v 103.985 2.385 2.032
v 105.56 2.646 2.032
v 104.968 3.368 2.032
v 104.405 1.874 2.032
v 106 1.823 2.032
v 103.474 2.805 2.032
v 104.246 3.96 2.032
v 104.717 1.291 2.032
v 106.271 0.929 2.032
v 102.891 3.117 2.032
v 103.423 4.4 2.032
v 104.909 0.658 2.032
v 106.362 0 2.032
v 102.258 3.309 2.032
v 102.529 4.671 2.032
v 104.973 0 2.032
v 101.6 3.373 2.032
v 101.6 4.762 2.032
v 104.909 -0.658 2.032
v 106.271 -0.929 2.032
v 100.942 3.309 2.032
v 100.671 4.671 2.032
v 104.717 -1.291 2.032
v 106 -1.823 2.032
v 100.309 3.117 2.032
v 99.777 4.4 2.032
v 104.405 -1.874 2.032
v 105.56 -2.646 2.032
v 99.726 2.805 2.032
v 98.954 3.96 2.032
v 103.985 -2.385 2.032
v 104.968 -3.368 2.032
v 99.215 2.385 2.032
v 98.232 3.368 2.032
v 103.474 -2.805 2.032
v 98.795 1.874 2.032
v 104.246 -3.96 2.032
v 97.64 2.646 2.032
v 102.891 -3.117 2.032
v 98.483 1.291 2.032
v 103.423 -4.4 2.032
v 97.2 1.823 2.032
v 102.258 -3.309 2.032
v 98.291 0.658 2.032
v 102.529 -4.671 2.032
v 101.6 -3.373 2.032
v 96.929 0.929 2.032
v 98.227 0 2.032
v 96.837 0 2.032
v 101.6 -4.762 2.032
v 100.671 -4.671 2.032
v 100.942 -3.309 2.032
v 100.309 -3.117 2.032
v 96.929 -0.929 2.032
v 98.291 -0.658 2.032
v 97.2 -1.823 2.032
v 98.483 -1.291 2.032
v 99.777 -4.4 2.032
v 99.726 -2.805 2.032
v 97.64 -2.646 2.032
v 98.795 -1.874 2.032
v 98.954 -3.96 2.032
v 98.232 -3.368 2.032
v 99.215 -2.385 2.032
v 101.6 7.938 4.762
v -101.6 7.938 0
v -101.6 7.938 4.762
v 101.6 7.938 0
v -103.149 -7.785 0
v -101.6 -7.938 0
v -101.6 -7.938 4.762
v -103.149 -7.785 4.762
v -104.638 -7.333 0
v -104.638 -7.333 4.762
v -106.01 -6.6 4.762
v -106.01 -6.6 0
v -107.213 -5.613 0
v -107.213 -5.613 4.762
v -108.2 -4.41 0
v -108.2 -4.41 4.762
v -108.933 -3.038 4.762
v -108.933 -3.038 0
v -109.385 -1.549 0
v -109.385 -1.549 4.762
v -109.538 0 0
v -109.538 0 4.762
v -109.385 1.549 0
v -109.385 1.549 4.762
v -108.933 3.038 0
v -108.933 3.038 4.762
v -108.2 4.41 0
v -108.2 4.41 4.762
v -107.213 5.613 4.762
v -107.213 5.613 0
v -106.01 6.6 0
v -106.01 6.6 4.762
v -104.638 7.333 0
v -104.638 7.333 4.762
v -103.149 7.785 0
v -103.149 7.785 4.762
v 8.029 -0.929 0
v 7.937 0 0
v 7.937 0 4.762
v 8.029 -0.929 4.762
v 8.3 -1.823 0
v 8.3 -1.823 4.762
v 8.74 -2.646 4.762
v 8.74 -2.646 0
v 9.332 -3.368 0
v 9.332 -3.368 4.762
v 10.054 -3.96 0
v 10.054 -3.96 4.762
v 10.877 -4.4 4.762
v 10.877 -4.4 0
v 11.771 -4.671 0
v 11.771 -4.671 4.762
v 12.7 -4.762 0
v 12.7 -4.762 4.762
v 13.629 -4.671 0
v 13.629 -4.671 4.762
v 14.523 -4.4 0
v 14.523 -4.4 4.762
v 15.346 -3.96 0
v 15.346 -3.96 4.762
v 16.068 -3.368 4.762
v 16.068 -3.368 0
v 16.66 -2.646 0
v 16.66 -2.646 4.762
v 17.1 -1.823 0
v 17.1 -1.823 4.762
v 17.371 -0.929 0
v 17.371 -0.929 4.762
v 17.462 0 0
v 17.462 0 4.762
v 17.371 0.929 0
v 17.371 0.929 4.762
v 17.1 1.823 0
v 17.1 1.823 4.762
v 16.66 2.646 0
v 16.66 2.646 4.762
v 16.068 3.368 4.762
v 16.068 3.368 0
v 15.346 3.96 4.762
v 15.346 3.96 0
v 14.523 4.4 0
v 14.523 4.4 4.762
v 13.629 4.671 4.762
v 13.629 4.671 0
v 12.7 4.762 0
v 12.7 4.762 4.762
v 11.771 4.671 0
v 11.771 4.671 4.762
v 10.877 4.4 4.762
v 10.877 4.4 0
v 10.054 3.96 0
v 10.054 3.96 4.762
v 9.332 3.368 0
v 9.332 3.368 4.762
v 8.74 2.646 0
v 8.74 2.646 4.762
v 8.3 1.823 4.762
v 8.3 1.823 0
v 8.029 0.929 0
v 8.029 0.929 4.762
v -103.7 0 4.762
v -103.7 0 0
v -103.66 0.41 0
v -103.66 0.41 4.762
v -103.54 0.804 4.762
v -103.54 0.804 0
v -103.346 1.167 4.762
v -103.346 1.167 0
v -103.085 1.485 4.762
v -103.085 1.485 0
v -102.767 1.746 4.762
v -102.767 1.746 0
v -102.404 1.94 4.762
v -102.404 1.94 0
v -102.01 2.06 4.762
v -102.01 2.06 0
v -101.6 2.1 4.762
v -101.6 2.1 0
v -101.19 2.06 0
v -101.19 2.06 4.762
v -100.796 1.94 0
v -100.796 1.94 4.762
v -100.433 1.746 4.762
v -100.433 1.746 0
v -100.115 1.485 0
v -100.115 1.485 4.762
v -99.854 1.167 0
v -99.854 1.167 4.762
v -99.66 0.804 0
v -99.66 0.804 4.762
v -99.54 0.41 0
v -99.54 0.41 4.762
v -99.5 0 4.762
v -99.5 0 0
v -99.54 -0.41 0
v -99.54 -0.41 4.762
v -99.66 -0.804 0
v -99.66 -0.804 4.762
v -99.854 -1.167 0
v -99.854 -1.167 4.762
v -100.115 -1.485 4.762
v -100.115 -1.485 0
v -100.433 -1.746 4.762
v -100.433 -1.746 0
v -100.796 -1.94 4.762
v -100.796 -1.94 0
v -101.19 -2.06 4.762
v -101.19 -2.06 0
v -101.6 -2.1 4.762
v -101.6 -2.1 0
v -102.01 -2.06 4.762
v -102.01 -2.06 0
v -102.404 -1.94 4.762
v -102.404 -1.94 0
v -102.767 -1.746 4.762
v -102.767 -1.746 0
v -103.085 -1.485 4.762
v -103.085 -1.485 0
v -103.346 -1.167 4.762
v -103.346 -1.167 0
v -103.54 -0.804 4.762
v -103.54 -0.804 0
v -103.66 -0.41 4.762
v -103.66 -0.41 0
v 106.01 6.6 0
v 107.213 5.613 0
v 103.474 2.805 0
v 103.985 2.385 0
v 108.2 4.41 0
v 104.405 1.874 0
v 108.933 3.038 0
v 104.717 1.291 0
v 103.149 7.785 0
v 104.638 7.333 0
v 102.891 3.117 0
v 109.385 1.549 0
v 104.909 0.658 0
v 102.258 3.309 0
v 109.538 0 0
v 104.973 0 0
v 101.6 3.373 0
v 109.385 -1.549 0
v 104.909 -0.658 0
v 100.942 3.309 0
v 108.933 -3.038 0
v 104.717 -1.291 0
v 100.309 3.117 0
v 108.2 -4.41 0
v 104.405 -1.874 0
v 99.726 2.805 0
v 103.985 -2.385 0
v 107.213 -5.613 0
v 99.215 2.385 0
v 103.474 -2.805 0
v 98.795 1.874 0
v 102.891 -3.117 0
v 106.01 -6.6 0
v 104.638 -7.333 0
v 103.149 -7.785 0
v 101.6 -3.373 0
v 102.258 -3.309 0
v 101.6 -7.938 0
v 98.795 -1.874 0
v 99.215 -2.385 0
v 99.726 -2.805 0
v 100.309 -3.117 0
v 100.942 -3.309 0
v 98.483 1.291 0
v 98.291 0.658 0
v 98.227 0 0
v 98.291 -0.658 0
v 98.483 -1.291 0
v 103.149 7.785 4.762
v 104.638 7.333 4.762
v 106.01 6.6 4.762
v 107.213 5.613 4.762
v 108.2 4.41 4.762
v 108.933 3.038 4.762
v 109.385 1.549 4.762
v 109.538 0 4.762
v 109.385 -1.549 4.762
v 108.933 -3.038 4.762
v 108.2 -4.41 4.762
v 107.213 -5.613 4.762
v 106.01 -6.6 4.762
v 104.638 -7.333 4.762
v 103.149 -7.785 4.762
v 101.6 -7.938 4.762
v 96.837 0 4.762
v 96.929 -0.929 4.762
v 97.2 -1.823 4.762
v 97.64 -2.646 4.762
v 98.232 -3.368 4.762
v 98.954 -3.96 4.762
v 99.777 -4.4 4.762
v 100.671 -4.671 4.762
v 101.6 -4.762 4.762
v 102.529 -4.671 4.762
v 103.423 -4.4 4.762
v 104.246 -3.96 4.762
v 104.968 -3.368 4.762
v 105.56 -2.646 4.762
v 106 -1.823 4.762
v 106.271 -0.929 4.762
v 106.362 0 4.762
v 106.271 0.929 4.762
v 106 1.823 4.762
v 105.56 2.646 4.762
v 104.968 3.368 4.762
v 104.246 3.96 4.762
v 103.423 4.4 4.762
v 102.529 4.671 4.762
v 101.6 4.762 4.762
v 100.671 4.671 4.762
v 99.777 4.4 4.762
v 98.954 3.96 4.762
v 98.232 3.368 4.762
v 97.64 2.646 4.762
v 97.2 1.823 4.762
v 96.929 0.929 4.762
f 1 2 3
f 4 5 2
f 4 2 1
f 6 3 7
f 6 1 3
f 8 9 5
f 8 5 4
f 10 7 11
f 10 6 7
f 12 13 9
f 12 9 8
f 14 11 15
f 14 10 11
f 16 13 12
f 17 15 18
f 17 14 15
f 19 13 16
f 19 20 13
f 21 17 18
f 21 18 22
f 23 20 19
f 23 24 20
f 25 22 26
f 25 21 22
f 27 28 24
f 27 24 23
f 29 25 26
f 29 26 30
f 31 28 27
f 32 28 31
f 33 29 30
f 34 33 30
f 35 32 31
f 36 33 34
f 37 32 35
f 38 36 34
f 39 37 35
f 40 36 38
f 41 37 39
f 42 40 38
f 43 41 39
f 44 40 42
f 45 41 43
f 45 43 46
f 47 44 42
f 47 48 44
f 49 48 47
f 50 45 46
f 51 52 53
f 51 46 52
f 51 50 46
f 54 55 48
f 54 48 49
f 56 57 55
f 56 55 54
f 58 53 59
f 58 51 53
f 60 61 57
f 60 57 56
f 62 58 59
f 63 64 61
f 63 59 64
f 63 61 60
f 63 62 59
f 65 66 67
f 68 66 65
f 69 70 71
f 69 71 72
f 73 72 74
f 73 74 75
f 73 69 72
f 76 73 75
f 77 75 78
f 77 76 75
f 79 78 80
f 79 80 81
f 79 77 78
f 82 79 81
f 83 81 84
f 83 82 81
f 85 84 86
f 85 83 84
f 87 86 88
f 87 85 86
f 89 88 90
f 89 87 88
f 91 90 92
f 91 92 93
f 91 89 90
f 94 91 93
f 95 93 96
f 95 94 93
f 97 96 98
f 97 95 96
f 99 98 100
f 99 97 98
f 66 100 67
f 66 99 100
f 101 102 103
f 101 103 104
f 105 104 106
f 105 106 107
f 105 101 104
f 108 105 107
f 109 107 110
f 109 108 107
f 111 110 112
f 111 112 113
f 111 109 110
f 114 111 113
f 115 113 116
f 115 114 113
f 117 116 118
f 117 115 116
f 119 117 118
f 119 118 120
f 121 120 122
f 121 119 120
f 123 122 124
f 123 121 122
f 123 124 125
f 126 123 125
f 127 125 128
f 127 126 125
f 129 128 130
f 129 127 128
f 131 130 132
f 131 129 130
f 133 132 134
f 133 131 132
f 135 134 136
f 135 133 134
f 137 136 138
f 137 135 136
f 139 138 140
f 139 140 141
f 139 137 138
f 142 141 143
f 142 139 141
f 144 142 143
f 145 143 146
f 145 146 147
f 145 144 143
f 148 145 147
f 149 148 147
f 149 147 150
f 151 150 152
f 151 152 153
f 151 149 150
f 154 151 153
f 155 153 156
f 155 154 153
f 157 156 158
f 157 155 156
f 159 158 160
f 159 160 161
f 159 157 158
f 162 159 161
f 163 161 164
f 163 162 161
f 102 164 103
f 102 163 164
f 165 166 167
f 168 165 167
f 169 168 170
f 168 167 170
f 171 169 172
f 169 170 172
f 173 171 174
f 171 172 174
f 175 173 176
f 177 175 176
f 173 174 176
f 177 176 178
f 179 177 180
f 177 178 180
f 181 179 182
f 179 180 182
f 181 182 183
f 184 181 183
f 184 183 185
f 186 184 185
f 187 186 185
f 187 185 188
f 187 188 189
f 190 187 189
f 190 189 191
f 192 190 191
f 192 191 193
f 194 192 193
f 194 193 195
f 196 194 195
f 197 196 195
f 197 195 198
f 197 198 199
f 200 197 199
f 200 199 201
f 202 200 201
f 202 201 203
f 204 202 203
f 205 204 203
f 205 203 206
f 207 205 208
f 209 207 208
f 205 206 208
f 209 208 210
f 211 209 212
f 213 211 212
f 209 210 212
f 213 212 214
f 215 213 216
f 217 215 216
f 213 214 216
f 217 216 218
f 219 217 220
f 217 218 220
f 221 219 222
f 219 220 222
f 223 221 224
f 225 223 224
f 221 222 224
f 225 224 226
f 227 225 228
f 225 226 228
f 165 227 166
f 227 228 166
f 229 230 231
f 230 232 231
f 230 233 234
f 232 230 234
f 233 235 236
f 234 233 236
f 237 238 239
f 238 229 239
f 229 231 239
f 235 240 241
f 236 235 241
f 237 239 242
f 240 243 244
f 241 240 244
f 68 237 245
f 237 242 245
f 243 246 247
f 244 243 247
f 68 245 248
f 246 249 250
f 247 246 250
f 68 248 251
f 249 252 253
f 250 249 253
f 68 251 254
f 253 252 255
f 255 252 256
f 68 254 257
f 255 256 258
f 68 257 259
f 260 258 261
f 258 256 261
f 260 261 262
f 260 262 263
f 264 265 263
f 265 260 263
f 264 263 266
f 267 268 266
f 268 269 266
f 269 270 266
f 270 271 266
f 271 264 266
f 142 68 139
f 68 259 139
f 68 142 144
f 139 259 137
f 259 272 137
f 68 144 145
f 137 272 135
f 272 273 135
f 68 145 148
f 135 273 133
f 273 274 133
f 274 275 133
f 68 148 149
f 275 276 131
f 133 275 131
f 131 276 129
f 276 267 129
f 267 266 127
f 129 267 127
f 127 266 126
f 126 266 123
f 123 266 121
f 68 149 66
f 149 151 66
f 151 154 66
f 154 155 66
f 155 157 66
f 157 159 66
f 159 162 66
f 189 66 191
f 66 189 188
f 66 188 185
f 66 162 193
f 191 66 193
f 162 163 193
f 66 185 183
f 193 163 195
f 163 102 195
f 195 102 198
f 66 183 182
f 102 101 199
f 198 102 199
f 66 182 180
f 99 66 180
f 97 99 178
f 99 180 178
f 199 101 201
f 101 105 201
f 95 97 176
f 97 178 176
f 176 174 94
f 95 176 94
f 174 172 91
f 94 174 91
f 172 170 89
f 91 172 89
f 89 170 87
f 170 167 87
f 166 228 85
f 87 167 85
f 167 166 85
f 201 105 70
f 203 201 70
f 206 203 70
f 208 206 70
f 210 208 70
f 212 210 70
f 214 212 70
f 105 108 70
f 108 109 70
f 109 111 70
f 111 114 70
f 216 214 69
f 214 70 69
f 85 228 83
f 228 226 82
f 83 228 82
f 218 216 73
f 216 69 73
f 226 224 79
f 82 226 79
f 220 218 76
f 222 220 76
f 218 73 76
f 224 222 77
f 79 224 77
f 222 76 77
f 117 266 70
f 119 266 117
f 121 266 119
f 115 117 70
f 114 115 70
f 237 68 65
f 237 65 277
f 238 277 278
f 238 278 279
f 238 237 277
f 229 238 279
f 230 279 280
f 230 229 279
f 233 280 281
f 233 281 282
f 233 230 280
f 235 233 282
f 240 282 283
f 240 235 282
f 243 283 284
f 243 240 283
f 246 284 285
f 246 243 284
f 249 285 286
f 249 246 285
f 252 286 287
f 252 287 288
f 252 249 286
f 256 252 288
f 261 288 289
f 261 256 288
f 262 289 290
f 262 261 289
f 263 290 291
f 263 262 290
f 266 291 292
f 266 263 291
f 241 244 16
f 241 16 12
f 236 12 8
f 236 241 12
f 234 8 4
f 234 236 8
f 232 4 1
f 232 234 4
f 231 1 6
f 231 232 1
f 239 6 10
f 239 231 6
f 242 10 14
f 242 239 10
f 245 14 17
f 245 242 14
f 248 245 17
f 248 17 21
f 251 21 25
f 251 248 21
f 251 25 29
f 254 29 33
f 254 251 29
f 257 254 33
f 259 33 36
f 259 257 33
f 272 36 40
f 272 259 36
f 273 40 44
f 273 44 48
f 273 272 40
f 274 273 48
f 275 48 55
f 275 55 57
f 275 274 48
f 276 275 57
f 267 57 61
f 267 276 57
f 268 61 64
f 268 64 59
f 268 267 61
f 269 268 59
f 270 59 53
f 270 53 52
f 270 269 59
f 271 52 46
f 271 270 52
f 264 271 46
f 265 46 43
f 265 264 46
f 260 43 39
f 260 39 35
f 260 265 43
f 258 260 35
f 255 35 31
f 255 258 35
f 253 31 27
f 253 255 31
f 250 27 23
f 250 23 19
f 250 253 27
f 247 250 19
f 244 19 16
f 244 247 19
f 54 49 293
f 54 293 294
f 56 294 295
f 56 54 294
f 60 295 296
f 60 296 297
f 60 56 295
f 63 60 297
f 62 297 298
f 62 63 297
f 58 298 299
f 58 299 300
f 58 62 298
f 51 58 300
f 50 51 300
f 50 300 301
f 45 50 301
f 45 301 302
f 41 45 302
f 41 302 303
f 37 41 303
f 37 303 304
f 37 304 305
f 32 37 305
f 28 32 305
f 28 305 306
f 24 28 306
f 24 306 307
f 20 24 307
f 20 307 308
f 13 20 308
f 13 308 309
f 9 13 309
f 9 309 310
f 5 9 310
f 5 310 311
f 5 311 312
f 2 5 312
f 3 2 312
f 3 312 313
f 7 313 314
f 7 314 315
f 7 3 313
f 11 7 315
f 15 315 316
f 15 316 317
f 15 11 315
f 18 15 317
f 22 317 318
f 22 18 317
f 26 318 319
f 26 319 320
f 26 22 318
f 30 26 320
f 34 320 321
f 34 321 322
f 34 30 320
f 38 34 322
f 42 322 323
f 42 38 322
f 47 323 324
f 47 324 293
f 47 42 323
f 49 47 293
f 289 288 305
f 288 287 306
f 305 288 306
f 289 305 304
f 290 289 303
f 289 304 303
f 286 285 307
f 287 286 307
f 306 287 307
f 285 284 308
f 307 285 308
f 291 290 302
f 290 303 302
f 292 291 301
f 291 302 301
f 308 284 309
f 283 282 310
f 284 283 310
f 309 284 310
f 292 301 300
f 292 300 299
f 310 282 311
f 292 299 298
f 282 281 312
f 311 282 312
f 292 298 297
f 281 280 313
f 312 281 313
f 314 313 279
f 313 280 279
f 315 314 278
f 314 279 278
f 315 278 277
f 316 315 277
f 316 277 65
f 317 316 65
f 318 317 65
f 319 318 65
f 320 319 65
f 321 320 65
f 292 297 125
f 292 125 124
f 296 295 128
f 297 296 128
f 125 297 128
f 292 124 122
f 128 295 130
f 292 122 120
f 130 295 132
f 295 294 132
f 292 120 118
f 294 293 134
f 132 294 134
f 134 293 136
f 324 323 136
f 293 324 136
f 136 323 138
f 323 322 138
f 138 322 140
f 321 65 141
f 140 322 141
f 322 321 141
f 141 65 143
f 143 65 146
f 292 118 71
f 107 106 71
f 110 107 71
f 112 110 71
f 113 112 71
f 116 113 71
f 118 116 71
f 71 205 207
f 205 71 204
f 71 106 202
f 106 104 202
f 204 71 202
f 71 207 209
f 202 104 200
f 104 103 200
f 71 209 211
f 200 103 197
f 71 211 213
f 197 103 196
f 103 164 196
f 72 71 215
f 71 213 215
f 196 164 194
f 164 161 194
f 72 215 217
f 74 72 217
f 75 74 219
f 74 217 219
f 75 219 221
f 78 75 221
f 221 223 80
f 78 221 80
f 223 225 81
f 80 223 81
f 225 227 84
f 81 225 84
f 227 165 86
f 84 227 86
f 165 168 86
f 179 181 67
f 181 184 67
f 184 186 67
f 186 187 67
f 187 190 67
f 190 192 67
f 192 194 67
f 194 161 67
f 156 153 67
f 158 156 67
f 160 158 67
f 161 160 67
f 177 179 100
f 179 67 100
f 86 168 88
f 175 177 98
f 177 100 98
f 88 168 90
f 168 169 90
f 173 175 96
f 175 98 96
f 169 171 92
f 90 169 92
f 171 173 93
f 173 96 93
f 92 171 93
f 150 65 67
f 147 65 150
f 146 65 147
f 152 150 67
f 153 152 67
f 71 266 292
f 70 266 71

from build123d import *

# Parameters (mm, degrees)
SKETCH1_R                 = 4.7625
BOSS_EXTRUDE1_DEPTH       = 4.7625
SKETCH1_3_R               = 4.7625
SKETCH1_3_R_2             = 3.3734375
BOSS_EXTRUDE2_DEPTH       = 2.032
M5X0_8_TAPPED_HOLE1_D     = 4.2
M5X0_8_TAPPED_HOLE1_DEPTH = 11.1333927
M5X0_8_TAPPED_HOLE1_TIP   = 1.2618073


with BuildPart() as part:
    # Sketch1 → Boss-Extrude1 (new body)
    with BuildSketch(Plane.XY):
        with BuildLine():
            Line((101.6, 7.9375), (-101.6, 7.9375))
            ThreePointArc((-101.6, 7.9375), (-109.5375, 0), (-101.6, -7.9375))
            Line((-101.6, -7.9375), (101.6, -7.9375))
            ThreePointArc((101.6, -7.9375), (109.5375, 0), (101.6, 7.9375))
        make_face()
        with Locations((12.7, 0)):
            Circle(SKETCH1_R, mode=Mode.SUBTRACT)
        with Locations((101.6, 0)):
            Circle(SKETCH1_R, mode=Mode.SUBTRACT)
    extrude(amount=BOSS_EXTRUDE1_DEPTH)

    # Sketch1<3> → Boss-Extrude2 (add)
    with BuildSketch(Plane.XY):
        with Locations((101.6, 0)):
            Circle(SKETCH1_3_R)
        with Locations((101.6, 0)):
            Circle(SKETCH1_3_R_2, mode=Mode.SUBTRACT)
    extrude(amount=BOSS_EXTRUDE2_DEPTH)

    # M5x0.8 Tapped Hole1
    with Locations(Plane.XY.offset(4.7625)):
        with Locations((-101.6, 0)):
            Hole(M5X0_8_TAPPED_HOLE1_D / 2, depth=M5X0_8_TAPPED_HOLE1_DEPTH)
            with Locations((0, 0, -(M5X0_8_TAPPED_HOLE1_DEPTH + M5X0_8_TAPPED_HOLE1_TIP / 2))):  # 118° drill point
                Cone(0, M5X0_8_TAPPED_HOLE1_D / 2, M5X0_8_TAPPED_HOLE1_TIP, mode=Mode.SUBTRACT)


solid = part.part
